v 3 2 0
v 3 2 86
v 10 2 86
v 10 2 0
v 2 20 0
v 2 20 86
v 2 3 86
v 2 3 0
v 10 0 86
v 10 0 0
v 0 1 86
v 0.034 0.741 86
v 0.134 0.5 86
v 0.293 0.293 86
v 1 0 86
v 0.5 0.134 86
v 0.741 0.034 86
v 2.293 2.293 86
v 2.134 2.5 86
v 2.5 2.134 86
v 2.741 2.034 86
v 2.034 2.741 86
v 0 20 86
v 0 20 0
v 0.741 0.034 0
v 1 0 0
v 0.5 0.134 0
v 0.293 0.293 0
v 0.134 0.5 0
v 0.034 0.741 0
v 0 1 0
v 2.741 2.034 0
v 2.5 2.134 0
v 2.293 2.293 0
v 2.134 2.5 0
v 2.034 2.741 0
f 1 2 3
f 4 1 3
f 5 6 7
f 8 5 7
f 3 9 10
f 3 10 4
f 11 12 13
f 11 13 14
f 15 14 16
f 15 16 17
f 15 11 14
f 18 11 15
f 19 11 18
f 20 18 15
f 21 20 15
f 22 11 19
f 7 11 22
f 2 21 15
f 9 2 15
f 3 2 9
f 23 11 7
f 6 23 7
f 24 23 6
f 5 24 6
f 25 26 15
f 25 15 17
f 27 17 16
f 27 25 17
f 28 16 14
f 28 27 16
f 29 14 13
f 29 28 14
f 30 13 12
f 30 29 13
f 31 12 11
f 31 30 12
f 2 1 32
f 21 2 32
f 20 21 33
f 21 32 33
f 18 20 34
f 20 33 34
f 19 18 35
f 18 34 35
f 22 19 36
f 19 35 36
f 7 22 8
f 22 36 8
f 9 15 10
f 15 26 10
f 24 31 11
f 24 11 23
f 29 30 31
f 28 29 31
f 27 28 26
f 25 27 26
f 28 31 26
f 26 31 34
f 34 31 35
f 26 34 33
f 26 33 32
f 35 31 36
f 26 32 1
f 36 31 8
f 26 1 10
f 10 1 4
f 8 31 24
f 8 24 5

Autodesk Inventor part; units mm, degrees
ref_plane "YZ Plane" through (0, 0, 0) normal (1, 0, 0) x (0, 1, 0)
ref_plane "XZ Plane" through (0, 0, 0) normal (0, 1, 0) x (-1, 0, 0)
ref_plane "XY Plane" through (0, 0, 0) normal (0, 0, 1) x (1, 0, 0)
sketch "Szkic1" plane through (0, 0, 0) normal (0, 0, 1) x (1, 0, 0)
  line L0 (-2.2485, 0) -> (12.0414, 0) projected
  line L1 (0, -4.2485) -> (0, 24.0414) projected
  line L2 (10, 0) -> (1, 0)
  line L3 (0, 1) -> (0, 20)
  line L4 (2, 20) -> (2, 3)
  line L5 (3, 2) -> (10, 2)
  line L6 (0, 20) -> (2, 20)
  line L7 (10, 0) -> (10, 2)
  arc A0 (2, 3) -> (3, 2) centre (3, 3) ccw
  arc A1 (0, 1) -> (1, 0) centre (1, 1) ccw
  point P0 (0, 0)
  dimension "d0" = 20
  dimension "d1" = 10
  dimension "d2" = 2
  dimension "d3" = 1
extrude "Wyciągnięcie proste1" add sketch "Szkic1" along normal blind 86 contours A1 L1 L6 L4 A0 L5 L7 L0
properties part number "kątownik_mały3" material "Aluminium 6061"
